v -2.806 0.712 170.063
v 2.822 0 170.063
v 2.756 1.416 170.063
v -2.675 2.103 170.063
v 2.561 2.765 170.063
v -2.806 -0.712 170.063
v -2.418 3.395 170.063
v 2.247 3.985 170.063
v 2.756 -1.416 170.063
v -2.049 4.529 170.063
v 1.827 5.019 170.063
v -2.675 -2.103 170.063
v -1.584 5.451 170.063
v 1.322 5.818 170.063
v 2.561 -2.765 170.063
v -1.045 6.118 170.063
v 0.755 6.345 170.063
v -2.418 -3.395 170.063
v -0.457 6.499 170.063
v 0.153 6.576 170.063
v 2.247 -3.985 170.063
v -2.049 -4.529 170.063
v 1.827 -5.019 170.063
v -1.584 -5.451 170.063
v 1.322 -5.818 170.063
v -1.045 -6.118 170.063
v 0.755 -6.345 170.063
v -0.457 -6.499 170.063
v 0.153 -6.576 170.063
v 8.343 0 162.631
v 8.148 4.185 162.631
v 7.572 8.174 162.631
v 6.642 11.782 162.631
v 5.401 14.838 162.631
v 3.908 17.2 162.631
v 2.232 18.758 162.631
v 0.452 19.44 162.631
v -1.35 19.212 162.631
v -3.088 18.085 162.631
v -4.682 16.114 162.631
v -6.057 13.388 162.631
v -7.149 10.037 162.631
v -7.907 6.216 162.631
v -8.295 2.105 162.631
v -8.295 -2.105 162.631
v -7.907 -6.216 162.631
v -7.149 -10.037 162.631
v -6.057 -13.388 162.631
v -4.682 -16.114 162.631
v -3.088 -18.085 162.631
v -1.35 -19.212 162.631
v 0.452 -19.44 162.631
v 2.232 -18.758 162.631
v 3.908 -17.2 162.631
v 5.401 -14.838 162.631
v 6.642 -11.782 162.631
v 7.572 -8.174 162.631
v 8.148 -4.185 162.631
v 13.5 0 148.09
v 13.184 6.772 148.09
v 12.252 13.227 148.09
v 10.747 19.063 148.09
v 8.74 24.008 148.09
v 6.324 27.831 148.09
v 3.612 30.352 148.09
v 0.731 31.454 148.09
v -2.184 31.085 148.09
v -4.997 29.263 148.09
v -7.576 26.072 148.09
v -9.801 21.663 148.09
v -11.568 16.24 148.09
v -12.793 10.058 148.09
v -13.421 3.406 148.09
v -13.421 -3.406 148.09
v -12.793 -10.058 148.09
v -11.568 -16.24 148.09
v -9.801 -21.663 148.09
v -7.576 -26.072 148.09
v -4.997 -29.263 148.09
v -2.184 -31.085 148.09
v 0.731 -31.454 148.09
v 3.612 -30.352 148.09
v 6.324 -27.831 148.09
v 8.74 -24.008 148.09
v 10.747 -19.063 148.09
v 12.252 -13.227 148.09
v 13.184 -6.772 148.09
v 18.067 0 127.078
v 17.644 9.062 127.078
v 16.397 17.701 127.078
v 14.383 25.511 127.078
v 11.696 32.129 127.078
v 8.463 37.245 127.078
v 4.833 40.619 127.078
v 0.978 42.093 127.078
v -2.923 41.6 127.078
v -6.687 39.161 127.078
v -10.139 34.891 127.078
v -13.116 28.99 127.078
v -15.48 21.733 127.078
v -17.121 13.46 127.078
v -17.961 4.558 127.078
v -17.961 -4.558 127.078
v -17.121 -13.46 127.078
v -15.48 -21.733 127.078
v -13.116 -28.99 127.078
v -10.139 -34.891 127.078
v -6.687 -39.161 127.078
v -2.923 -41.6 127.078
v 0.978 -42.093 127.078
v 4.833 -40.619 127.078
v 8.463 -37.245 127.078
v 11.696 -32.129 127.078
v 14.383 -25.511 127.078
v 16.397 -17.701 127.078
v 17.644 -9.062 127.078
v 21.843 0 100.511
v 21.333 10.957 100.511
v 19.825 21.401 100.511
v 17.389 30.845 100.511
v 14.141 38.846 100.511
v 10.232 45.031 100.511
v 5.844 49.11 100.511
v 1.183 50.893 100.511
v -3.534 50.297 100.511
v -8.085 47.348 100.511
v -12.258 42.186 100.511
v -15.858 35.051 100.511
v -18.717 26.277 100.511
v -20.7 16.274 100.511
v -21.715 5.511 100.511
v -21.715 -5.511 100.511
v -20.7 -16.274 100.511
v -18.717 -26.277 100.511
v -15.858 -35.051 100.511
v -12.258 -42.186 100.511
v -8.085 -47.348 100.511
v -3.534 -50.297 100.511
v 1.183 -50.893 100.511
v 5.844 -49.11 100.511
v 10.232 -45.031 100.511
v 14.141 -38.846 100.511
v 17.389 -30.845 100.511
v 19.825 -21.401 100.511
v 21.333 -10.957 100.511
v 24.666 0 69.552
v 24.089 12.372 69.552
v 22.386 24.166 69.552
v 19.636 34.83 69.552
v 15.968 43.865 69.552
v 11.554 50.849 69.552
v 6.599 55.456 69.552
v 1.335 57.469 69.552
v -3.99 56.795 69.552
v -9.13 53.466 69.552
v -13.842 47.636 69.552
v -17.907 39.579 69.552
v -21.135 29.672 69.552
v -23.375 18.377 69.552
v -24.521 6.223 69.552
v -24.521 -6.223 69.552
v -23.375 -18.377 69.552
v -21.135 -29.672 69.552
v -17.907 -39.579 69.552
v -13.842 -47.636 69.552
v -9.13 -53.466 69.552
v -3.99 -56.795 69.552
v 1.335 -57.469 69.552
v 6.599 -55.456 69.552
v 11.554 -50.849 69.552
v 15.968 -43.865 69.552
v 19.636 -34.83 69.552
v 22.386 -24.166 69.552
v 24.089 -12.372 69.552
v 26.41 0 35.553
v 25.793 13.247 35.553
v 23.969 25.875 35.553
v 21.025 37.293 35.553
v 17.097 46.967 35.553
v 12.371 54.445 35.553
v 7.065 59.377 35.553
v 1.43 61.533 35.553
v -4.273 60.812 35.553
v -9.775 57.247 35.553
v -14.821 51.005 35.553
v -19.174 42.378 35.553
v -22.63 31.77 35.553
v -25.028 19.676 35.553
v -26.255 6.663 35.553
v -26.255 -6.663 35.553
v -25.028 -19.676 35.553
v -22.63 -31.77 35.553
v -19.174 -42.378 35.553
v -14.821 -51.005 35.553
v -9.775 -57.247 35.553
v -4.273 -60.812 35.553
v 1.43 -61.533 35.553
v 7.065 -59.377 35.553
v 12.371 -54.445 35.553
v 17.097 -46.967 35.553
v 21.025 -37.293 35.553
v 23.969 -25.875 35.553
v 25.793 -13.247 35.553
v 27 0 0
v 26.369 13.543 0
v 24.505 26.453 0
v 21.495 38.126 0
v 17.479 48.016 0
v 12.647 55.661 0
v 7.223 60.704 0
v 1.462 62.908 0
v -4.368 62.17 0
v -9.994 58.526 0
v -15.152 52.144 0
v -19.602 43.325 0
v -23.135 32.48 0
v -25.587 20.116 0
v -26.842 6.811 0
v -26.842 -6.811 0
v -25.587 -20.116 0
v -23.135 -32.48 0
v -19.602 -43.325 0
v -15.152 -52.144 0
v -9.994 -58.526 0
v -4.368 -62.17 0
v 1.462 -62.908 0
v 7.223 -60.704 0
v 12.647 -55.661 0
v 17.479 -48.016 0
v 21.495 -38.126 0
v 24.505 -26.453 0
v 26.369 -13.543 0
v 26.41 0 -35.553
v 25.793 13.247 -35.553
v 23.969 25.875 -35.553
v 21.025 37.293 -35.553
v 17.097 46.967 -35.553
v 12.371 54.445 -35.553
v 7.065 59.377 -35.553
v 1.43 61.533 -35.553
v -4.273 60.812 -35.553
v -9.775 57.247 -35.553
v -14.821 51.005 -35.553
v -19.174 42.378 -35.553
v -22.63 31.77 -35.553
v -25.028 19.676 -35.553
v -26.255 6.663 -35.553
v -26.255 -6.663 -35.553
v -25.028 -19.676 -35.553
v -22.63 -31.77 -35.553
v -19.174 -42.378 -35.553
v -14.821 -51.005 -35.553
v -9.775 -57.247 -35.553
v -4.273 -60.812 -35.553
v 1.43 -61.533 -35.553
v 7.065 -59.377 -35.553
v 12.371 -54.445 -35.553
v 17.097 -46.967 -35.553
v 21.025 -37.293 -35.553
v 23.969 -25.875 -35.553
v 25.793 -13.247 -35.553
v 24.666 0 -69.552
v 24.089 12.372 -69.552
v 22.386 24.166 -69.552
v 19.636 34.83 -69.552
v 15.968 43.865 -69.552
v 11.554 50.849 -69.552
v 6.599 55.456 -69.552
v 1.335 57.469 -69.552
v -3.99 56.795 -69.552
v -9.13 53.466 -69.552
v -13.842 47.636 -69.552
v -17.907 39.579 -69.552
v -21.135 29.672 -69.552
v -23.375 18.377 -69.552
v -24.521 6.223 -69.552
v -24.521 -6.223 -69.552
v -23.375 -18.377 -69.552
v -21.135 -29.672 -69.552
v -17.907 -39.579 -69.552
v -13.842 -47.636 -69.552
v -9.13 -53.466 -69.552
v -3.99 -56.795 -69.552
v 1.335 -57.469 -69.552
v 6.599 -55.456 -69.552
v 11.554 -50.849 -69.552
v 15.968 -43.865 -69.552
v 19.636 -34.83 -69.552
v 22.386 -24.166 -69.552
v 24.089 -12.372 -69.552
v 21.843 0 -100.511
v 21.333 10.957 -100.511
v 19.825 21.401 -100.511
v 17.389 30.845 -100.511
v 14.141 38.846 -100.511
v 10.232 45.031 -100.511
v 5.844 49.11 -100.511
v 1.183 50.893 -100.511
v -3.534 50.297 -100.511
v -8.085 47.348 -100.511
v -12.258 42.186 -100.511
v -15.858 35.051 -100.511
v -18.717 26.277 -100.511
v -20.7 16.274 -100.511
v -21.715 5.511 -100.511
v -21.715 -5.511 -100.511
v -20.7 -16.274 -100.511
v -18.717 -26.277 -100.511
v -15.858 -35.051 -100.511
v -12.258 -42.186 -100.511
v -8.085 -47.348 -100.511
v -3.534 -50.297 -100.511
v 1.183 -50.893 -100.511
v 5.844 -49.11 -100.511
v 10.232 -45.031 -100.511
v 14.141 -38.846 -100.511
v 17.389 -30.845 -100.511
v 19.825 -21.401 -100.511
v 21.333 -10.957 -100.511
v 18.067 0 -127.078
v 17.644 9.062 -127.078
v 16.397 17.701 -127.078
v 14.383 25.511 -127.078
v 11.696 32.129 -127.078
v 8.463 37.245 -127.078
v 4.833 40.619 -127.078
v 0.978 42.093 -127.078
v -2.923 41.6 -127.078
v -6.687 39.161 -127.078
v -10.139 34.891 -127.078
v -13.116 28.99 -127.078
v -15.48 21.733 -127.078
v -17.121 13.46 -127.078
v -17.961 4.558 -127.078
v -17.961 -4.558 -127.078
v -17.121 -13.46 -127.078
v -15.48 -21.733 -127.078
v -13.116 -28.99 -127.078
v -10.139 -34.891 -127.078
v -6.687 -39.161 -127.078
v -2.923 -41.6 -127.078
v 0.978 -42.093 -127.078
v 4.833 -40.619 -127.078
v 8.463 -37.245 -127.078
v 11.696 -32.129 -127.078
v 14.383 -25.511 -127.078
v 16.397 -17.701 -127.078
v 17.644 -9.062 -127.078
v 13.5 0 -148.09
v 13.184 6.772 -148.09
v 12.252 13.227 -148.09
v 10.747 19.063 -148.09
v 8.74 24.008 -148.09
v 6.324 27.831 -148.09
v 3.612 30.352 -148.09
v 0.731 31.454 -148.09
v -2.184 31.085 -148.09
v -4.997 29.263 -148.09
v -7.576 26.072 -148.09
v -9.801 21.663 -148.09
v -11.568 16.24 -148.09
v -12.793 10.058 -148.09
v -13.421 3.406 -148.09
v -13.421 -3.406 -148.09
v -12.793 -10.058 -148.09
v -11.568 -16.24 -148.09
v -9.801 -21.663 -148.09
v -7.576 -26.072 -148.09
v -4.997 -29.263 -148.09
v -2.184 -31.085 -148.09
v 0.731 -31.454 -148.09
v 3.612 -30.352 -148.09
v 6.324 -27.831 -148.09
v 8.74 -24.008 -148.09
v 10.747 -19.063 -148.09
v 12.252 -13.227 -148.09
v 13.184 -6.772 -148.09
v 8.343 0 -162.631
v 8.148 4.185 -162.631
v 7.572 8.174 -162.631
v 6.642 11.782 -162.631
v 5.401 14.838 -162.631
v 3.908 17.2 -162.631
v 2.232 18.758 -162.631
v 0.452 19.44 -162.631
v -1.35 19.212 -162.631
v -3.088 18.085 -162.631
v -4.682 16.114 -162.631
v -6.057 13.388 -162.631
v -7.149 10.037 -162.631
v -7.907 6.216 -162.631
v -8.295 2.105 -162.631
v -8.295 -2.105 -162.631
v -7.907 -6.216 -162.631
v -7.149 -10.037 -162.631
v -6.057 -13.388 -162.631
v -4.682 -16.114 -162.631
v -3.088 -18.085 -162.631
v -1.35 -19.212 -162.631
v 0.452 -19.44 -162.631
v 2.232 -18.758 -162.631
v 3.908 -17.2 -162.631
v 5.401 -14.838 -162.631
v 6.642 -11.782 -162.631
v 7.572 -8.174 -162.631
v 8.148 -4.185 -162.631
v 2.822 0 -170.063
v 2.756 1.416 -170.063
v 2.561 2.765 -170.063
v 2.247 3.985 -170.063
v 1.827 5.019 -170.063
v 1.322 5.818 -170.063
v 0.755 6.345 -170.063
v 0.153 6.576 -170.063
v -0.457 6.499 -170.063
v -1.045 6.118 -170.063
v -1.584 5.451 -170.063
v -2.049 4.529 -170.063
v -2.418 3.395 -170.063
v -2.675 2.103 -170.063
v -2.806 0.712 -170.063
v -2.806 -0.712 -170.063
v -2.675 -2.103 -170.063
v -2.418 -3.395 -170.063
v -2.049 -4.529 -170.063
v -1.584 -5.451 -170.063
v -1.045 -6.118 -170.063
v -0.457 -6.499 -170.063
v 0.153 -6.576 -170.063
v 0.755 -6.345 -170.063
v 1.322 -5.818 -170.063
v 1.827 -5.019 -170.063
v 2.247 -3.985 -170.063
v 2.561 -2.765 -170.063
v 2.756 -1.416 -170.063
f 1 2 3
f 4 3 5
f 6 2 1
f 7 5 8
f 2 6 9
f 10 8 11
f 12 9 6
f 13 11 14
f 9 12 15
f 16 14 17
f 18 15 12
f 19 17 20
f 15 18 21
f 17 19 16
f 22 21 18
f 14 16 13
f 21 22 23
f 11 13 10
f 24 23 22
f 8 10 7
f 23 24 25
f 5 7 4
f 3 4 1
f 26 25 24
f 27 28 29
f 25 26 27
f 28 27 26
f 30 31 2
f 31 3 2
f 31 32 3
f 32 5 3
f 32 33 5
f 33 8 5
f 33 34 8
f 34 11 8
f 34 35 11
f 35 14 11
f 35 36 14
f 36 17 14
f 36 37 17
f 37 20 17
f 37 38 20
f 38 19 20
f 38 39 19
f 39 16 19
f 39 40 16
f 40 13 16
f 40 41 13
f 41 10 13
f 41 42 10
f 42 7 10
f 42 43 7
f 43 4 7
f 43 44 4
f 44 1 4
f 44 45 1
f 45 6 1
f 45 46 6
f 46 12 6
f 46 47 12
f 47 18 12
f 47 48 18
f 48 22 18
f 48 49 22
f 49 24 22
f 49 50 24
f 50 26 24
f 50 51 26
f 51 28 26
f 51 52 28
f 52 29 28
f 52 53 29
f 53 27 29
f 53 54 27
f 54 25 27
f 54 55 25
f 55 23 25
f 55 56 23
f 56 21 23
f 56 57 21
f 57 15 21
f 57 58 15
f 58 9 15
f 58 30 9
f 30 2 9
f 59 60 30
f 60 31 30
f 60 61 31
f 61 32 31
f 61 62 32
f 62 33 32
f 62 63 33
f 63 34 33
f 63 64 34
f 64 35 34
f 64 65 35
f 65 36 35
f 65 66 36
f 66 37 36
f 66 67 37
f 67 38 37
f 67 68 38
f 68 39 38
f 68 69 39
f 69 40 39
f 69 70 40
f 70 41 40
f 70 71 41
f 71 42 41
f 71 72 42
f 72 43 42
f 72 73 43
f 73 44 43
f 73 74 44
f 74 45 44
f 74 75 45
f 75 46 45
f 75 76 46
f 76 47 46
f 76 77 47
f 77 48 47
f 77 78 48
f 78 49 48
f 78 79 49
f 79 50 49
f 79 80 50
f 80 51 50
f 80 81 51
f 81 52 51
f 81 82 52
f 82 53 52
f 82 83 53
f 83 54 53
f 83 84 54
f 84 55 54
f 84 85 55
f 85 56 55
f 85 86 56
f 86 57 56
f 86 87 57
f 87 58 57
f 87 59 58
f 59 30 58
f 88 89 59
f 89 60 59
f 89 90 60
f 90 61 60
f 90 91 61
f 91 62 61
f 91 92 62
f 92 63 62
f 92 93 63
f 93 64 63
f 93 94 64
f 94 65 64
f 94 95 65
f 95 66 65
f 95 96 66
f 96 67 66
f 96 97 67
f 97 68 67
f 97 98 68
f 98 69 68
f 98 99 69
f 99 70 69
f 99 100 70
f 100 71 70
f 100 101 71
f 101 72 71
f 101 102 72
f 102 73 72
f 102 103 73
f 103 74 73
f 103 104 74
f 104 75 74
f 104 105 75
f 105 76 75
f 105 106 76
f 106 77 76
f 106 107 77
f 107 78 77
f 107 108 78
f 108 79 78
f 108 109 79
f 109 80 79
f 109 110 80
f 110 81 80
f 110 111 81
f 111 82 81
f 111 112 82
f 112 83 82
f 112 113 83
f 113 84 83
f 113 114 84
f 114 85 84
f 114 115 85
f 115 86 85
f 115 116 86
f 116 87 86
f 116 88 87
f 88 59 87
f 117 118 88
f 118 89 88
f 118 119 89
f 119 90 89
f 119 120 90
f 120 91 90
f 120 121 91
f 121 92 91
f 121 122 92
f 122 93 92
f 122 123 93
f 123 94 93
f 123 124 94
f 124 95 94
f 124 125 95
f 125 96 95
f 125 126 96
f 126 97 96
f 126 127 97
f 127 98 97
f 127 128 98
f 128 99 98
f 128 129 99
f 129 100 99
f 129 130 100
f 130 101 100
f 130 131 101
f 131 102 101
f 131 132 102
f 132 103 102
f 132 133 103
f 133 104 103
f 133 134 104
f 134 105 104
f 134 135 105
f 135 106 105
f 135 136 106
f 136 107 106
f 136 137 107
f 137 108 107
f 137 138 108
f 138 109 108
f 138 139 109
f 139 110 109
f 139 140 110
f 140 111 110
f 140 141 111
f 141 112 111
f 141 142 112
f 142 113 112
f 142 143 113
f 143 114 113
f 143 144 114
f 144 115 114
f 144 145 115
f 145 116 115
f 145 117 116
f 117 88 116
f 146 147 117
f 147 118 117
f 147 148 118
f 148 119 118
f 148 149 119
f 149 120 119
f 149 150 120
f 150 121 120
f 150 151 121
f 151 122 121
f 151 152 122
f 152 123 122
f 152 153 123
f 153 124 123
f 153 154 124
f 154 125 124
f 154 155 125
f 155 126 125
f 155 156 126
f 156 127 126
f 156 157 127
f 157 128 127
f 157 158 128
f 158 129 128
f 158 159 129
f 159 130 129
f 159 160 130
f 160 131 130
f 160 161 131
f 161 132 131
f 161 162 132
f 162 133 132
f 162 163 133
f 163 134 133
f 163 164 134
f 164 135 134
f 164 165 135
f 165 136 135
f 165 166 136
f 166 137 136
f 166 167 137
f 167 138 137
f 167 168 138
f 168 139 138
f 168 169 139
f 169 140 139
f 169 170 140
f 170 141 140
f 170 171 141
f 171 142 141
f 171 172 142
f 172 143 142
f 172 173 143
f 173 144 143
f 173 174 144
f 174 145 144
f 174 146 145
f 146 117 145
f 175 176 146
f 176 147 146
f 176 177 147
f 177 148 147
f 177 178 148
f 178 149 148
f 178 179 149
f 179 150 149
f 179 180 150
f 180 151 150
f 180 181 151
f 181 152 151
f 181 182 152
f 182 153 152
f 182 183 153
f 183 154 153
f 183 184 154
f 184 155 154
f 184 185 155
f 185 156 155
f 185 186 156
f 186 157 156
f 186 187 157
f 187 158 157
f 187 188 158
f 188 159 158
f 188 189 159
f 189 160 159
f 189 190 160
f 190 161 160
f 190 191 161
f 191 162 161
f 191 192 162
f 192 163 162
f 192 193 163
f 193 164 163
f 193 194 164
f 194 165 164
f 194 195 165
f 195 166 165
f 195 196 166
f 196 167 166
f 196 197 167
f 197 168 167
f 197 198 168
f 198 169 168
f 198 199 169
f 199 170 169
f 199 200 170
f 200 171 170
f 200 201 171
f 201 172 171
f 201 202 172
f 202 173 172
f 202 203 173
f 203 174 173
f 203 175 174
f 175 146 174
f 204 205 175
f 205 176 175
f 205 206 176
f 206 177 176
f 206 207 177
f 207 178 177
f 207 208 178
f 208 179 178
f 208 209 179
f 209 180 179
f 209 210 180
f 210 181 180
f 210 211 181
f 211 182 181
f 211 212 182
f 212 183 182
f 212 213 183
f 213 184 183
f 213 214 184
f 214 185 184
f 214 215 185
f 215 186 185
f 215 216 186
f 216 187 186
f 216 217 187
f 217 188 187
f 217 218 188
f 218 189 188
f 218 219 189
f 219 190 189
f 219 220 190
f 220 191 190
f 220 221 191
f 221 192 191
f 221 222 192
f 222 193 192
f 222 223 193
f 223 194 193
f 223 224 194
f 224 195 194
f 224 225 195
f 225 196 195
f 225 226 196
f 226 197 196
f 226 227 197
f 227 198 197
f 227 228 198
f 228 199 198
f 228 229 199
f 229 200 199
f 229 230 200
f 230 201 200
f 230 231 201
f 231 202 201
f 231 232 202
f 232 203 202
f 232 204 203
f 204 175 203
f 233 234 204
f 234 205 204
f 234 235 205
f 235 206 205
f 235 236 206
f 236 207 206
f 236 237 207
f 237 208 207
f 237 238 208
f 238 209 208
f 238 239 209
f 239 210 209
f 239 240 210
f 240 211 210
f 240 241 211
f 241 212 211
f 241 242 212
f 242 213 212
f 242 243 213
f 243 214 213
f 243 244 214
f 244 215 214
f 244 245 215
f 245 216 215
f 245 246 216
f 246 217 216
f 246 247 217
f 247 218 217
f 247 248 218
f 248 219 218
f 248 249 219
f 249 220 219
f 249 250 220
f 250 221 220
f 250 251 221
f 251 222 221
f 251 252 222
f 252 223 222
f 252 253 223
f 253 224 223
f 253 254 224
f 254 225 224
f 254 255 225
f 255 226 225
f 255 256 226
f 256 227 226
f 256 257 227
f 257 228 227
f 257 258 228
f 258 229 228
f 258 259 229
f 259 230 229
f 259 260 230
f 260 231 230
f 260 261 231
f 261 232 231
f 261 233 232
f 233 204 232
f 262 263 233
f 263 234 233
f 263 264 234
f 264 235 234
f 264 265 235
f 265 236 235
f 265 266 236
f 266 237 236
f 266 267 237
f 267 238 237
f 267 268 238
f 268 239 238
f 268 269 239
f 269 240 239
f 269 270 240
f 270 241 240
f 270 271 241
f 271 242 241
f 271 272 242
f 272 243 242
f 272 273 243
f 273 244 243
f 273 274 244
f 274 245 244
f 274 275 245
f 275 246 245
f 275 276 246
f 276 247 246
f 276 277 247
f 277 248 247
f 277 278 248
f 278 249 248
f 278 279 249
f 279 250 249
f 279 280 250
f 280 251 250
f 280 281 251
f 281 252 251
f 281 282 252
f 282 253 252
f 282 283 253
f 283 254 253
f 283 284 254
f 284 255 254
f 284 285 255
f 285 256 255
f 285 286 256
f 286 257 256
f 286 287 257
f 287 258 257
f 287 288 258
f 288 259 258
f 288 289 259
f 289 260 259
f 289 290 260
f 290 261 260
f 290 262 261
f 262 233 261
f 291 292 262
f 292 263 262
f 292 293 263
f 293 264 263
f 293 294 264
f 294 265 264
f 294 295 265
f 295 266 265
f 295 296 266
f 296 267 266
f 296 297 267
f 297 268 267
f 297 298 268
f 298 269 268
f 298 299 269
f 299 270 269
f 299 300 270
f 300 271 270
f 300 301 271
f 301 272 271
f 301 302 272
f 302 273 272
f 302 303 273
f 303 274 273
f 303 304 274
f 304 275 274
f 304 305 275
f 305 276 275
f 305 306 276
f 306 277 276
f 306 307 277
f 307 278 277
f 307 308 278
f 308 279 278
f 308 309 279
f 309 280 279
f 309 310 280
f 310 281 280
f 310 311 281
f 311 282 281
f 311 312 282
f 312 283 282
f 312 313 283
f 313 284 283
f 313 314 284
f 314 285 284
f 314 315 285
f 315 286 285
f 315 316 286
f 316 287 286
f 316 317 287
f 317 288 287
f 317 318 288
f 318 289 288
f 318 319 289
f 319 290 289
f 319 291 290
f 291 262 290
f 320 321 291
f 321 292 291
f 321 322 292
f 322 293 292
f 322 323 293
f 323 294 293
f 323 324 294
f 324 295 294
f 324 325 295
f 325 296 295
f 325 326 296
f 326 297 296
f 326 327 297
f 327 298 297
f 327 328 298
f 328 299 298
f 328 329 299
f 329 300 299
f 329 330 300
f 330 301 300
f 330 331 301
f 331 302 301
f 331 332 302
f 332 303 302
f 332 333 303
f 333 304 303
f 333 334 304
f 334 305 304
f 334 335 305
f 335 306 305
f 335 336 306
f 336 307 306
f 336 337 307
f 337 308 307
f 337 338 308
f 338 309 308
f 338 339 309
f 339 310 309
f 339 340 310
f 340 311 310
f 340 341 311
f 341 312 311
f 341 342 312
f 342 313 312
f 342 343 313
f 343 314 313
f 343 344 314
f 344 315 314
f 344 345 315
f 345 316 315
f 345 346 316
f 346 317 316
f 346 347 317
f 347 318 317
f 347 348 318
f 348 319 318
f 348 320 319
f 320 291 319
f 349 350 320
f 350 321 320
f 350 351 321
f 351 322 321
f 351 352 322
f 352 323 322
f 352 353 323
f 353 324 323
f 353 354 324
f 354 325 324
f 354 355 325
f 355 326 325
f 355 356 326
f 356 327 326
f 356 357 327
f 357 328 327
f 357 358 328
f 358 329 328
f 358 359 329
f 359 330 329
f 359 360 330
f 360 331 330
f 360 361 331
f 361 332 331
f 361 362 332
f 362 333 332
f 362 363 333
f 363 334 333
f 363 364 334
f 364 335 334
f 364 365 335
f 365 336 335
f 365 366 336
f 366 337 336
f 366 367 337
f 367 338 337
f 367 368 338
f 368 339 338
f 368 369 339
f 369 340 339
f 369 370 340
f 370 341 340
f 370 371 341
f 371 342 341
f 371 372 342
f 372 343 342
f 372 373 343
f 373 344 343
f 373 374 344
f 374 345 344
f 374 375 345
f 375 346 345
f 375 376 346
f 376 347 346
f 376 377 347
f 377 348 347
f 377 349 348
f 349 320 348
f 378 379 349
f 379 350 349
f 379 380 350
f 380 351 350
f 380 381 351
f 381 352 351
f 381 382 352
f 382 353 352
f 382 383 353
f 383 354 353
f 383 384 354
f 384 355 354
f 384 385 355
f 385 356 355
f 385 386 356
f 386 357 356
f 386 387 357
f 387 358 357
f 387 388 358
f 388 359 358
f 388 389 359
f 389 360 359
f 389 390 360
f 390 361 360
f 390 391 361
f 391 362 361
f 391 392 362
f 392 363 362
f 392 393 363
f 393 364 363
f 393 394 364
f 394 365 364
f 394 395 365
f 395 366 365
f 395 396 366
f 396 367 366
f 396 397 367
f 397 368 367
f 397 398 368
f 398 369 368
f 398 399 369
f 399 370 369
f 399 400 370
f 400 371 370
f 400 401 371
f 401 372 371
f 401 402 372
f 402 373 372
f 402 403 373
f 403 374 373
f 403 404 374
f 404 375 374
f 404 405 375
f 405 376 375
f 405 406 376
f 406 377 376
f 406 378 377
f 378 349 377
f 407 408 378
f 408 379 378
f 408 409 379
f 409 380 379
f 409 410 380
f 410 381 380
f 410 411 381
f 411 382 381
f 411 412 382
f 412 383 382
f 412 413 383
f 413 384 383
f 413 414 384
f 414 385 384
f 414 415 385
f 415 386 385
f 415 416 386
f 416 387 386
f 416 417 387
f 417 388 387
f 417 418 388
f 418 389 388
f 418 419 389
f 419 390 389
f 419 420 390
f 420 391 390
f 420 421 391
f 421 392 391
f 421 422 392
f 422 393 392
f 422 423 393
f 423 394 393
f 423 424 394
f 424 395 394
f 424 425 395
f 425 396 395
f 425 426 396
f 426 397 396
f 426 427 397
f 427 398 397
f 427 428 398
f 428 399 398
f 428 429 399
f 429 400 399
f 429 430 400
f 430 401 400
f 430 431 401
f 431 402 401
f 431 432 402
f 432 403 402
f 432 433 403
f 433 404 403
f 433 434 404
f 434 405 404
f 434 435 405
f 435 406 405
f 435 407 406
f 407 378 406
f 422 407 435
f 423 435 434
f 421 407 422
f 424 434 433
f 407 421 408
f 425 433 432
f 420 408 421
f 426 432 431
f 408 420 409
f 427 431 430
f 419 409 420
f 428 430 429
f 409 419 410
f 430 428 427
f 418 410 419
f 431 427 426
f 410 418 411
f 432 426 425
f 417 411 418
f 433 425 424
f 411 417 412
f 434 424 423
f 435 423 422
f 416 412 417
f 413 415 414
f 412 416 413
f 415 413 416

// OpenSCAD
// Generated by SolidPython 1.0.1 on 2020-07-29 00:46:45


scale(v = [3, 7, 19]) {
	sphere(r = 9);
}
/***********************************************
*********      SolidPython code:      **********
************************************************
 
# import packages: SolidPython
from solid import *
from solid.utils import *
from itertools import chain, combinations, permutations


class Resize:

    def __init__(self, scad_file):
        self.scad_file = scad_file
        #self.scad_file = import_scad(scad_file)
        # cone/cylinder param:
        self.r1 = 0
        self.r2 = 0
        self.h = 0
        # rectangular prism param:
        self.w = 0
        self.l = 0
        # ellipse param:
        self.r = 0

    # import OpenScad code (file name corresponds to shape)


    # classify shape + parameters
    def assign(self, param1, param2, param3):
        if self.scad_file == 'cone.scad':
            self.r1 = param1
            self.r2 = param2
            self.h = param3
        elif self.scad_file == 'cylinder.scad':
            self.r1 = param1
            self.r2 = param2
            self.h = param3
        elif self.scad_file == 'rectangularPrism.scad':
            self.h = param1
            self.l = param2
            self.w = param3
        else:
            self.r = param1
            self.h = param2

    # resize parameters
    def iterate(self):
        x = range(3, 20, 2)
        i = 1
        if self.scad_file == 'cone.scad':
            tempList = list(permutations(x, 2))
            for temp in tempList:
                param1 = temp[0]
                param2 = temp[1]
                filepath = 'produced_scad_files/' + 'cone' + str(param1) + '_' + str(param2) + '_' + '.scad'
                scad_render_to_file(cylinder(h=param1, r1=param2, r2=0), filepath)

        elif self.scad_file == 'cylinder.scad':
            tempList = list(permutations(x, 3))
            for temp in tempList:
                param1 = temp[0]
                param2 = temp[1]
                filepath = 'produced_scad_files/' + 'cylinder' + str(param1) + '_' + str(param2) + '_' + '.scad'
                scad_render_to_file(cylinder(h=param1, r1=param2, r2=param2), filepath)

        elif self.scad_file == 'rectangularPrism.scad':
            tempList = list(permutations(x, 3))
            for temp in tempList:
                param1 = temp[0]
                param2 = temp[1]
                param3 = temp[2]
                filepath = 'produced_scad_files/' + 'rectangularPrism' + str(param1) + '_' + str(param2) + '_' + str(
                    param3) + '.scad'
                scad_render_to_file(cube(size=(param1, param2, param3)), filepath)

        elif self.scad_file == 'ellipse.scad':
            tempList = list(permutations(x, 4))
            for temp in tempList:
                param1 = temp[0]
                param2 = temp[1]
                param3 = temp[2]
                param4 = temp[3]
                filepath = 'produced_scad_files/' + 'ellipse' + str(param1) + '_' + str(param2) + '_' + str(param3) + '_' + str(param4) + '.scad'
                scad_render_to_file(scale([param1, param2, param3])(sphere(r=param4)), filepath)

    def render_to_scadfile(self):
        scad_render_to_file(scad, 'example.scad') 
 
************************************************/
